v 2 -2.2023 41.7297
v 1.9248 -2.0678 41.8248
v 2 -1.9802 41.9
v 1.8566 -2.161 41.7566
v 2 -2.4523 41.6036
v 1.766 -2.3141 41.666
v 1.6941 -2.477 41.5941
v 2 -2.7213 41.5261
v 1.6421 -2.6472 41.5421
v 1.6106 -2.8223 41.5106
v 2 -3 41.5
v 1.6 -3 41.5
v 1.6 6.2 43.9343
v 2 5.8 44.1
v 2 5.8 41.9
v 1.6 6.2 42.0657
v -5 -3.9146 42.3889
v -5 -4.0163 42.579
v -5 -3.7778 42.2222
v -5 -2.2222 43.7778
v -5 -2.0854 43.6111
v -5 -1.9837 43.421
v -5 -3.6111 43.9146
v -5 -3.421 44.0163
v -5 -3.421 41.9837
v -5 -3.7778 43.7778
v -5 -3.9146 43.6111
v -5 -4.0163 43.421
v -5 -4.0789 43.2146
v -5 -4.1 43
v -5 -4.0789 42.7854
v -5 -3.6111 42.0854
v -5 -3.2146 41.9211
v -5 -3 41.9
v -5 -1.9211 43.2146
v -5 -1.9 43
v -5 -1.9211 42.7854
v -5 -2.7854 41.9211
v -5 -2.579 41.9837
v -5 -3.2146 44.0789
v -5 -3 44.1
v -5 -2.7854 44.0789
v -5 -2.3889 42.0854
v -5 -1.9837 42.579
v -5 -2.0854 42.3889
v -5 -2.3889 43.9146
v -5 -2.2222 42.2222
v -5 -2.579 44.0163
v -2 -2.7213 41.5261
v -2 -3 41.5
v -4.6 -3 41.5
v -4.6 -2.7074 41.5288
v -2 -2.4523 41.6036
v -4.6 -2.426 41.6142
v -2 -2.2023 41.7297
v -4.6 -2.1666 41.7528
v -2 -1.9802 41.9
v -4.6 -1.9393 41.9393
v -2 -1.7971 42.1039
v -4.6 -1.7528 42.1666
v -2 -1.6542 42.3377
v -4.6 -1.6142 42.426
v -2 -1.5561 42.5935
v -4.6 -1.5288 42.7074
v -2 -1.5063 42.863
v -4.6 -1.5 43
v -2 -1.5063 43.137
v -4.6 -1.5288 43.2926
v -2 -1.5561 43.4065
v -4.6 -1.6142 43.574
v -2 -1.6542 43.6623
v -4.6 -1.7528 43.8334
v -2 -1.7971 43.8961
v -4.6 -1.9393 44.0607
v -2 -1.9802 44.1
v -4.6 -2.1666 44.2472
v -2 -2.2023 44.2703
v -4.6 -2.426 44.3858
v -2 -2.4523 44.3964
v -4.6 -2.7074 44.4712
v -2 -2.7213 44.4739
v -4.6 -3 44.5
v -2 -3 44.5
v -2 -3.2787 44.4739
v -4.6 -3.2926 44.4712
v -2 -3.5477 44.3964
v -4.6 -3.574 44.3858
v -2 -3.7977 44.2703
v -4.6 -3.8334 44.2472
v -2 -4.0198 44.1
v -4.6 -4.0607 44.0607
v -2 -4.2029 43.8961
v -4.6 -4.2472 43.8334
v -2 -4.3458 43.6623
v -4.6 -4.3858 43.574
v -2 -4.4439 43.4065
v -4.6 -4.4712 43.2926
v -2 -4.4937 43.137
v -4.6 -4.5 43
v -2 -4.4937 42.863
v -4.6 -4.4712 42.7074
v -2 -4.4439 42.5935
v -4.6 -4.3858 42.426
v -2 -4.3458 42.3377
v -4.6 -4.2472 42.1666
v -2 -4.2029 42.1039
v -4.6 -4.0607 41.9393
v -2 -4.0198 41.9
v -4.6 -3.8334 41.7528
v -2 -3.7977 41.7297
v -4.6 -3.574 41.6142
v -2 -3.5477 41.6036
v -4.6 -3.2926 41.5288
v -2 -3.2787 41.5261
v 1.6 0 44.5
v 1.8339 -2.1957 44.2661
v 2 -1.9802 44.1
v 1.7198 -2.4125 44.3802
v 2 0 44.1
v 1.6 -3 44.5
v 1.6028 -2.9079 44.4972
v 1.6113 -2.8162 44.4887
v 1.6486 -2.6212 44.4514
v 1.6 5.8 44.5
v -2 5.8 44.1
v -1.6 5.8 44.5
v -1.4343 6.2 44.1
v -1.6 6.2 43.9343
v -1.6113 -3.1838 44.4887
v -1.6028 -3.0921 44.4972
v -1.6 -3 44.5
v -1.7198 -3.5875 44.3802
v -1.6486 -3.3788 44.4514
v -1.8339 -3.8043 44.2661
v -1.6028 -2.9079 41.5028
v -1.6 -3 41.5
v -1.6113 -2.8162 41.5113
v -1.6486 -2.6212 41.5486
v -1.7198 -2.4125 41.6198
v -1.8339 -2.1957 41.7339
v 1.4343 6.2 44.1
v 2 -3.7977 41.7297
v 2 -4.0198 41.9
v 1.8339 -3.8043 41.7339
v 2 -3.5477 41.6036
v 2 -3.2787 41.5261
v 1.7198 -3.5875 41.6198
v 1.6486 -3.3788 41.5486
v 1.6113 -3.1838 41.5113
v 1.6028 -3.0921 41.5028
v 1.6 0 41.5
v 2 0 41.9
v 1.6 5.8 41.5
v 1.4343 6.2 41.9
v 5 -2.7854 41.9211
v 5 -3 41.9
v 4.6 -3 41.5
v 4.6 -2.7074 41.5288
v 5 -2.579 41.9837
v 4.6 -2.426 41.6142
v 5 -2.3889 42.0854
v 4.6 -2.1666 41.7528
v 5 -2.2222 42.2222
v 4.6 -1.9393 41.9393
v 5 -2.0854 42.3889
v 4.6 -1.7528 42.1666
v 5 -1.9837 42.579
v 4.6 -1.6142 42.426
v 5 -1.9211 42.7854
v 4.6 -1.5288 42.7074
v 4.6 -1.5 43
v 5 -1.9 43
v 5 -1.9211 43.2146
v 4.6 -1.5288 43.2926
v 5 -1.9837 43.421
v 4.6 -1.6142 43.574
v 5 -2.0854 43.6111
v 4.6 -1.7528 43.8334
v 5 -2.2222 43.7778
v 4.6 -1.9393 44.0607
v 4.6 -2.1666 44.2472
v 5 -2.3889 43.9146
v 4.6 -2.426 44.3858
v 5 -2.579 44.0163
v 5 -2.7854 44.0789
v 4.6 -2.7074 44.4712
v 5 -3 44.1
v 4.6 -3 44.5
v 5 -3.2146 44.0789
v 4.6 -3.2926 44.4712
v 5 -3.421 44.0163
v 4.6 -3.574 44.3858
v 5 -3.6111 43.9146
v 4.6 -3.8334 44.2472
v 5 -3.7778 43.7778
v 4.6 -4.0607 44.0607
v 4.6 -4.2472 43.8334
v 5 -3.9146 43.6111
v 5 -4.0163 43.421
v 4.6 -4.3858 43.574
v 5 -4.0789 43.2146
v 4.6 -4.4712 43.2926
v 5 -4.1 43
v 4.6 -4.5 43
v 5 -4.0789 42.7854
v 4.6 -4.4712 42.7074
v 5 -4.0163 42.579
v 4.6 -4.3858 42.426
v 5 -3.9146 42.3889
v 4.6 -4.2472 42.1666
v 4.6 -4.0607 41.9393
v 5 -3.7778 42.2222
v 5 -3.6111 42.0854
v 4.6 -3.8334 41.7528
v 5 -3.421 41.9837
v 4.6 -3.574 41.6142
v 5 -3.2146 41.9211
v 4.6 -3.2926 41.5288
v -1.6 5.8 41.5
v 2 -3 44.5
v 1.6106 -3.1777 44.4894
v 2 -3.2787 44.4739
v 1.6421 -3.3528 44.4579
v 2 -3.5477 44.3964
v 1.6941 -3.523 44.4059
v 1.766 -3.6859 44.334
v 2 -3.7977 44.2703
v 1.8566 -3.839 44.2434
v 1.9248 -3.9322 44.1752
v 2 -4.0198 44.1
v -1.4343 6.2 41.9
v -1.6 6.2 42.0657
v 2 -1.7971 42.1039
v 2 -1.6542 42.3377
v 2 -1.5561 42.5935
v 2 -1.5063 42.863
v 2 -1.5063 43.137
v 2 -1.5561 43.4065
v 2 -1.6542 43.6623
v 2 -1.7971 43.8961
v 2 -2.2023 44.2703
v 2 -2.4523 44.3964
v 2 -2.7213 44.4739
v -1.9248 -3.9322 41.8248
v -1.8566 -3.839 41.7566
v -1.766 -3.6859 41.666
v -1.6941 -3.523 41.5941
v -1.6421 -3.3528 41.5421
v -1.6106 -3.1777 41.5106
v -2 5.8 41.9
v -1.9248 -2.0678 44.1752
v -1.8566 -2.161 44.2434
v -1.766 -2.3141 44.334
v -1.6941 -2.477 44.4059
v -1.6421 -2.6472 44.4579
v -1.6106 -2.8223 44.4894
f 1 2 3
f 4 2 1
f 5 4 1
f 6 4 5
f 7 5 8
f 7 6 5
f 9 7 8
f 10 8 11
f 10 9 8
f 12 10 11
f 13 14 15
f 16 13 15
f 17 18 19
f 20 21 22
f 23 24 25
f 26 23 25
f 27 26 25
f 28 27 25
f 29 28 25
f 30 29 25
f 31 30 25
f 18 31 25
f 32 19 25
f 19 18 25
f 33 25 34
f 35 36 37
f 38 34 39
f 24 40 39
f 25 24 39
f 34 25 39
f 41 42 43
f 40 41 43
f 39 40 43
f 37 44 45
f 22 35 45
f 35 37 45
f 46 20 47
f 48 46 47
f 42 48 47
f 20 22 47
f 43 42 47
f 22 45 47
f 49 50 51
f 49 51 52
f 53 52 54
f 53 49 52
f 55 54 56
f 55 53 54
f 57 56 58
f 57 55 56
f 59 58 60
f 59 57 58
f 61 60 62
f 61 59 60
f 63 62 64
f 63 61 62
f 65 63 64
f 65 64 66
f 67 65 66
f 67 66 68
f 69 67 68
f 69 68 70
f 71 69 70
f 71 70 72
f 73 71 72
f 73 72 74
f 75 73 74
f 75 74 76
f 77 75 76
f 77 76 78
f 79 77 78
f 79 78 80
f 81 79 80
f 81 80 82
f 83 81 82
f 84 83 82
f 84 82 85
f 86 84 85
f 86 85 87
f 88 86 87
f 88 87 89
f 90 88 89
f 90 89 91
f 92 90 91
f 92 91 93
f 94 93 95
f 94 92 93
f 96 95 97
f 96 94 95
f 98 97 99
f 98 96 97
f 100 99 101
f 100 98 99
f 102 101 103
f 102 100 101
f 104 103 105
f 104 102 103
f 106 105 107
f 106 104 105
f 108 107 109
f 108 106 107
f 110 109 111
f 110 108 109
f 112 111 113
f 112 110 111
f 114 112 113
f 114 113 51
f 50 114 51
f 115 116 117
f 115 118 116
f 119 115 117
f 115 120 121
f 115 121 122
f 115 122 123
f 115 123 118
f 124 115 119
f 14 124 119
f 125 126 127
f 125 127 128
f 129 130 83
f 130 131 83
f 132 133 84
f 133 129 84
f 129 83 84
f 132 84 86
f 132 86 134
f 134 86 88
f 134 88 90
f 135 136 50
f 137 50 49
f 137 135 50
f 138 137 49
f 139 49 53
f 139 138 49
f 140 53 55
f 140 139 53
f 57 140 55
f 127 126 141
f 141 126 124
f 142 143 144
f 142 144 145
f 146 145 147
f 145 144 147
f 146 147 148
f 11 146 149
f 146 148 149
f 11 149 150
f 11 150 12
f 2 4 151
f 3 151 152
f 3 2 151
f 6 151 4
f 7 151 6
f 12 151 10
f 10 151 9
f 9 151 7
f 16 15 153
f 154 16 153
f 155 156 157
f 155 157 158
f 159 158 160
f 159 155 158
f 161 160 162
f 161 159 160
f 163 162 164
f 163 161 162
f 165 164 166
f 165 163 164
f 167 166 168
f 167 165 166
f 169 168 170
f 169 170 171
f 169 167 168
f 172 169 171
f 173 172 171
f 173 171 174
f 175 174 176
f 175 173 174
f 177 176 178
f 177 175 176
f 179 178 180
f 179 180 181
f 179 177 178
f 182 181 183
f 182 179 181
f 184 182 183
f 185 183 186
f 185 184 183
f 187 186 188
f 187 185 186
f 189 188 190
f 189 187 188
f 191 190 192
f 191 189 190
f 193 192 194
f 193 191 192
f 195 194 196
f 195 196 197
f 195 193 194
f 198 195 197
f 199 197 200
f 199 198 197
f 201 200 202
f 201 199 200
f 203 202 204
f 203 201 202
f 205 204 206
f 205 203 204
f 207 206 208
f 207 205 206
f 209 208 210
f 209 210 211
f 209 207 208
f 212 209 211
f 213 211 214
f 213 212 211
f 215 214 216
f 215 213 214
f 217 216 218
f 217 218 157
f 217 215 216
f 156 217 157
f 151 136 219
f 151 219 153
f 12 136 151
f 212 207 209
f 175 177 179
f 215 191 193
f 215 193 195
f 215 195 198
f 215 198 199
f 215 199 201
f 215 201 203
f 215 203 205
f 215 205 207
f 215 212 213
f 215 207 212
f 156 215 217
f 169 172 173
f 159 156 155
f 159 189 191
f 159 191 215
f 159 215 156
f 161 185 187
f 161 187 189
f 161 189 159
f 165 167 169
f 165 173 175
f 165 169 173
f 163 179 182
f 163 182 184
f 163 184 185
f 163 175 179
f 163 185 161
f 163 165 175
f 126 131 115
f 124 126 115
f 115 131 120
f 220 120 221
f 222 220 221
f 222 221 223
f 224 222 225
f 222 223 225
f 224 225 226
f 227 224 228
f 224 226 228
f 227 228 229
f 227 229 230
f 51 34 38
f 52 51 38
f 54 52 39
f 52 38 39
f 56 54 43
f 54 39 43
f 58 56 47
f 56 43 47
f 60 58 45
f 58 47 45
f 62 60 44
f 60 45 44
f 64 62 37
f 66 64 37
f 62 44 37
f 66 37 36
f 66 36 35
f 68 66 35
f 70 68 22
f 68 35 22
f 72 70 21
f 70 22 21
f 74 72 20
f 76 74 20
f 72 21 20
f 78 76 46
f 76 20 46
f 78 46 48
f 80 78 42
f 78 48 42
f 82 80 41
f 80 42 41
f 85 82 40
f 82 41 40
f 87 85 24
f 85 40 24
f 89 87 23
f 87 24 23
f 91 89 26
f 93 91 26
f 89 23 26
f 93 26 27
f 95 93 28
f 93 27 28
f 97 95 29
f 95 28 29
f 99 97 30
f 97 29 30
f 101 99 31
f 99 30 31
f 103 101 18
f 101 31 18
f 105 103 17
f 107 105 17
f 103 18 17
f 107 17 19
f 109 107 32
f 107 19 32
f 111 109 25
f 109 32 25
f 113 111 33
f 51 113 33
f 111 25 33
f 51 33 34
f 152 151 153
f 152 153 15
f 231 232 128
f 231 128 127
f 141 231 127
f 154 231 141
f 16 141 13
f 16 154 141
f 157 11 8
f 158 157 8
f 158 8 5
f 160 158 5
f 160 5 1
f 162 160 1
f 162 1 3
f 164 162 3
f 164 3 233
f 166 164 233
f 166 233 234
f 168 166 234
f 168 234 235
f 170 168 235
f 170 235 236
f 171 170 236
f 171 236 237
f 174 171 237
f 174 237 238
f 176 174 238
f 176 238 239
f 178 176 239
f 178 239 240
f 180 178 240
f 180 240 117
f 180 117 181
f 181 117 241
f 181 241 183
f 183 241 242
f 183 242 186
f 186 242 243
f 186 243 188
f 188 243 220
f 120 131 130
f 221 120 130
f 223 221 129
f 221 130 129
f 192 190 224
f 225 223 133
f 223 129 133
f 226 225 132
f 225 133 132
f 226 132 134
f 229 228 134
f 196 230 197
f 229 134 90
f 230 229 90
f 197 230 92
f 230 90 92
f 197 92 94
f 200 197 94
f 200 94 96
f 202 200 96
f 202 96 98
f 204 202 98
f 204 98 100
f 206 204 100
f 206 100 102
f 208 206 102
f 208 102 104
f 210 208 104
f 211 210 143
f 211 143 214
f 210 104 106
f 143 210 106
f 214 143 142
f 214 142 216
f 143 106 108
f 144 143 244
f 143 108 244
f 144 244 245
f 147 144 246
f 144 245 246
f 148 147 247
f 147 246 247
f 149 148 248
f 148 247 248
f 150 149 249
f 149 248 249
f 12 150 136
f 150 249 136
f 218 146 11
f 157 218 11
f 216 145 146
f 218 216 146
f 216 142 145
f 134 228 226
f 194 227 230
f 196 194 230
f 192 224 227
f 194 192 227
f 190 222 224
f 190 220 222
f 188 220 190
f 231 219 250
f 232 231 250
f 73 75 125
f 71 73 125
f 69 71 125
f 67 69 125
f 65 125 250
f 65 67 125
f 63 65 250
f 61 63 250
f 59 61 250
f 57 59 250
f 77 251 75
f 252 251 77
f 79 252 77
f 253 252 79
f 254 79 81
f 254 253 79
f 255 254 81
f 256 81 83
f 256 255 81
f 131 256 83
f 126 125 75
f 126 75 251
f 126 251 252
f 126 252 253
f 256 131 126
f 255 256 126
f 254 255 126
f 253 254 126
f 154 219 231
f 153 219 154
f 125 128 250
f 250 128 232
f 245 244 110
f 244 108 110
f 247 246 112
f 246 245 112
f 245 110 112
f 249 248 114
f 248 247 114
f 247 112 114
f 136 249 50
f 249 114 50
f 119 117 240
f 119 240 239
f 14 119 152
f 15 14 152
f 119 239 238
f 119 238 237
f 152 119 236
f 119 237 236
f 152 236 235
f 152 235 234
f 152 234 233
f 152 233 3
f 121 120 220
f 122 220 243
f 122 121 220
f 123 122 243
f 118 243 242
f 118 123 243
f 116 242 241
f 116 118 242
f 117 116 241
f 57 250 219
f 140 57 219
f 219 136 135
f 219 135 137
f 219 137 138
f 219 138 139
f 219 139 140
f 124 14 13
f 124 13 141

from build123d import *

# Parameters (mm, degrees)
SKETCH_1_R               = 49.99999999999999
EXTRUDE_1_DEPTH          = 50
CUT_EXTRUDE_2_DEPTH      = 87.60254037844385
CUT_EXTRUDE_3_DEPTH      = 76.00000000000004
FILLET_1_R               = 2
CHAMFER_1_SIZE           = 0.6
SHELL_1_T                = -1.2
EXTRUDE_2_DEPTH          = 2
EXTRUDE_2_DEPTH_BACK     = 2
SKETCH_4_R               = 1.500000000000004
SKETCH_5_R               = 1.500000000000004
EXTRUDE_3_DEPTH          = 3
CUT_EXTRUDE_4_DEPTH      = 75.75240590513992
CUT_EXTRUDE_4_DEPTH_BACK = 75.75240590513992
SKETCH_7_W               = 4
SKETCH_7_H               = 3.000000000000007
EXTRUDE_4_DEPTH          = 3
SKETCH_8_W               = 61.68253403520822
SKETCH_8_H               = 49.35584928772633
CUT_EXTRUDE_5_DEPTH      = 75.75240590513992
SKETCH_9_W               = 4
SKETCH_9_H               = 3.000000000000007
EXTRUDE_5_DEPTH          = 6.2
CHAMFER_2_SIZE           = 0.4
CHAMFER_3_SIZE           = 0.4
CHAMFER_4_SIZE           = 0.4


with BuildPart() as part:
    # 草图1 → 凸台-拉伸1 (new body)
    with BuildSketch(Plane(origin=(0, 0, 0), x_dir=(1, 0, 0), z_dir=(0, 1, 0))):
        with Locations(Location((0, 0, 0), (0, 0, 270))):
            Circle(SKETCH_1_R)
    extrude(amount=EXTRUDE_1_DEPTH)

    # 草图2 → 切除-拉伸2 (cut, through all)
    with BuildSketch(Plane(origin=(0, 50, 0), x_dir=(1, 0, 0), z_dir=(0, 1, 0))):
        with BuildLine():
            Line((-24.999999999999993, -43.301270189221945), (-7.11e-15, -1.421e-14))
            Line((7.11e-15, -1.421e-14), (25.00000000000002, -43.301270189221924))
            ThreePointArc((25.00000000000002, -43.301270189221924), (2.487e-14, 50), (-25.000000000000053, -43.30127018922191))
        make_face()
    extrude(amount=-CUT_EXTRUDE_2_DEPTH, mode=Mode.SUBTRACT)

    # 草图3 → 切除-拉伸3 (cut, through all)
    with BuildSketch(Plane(origin=(0, 50, 0), x_dir=(1, 0, 0), z_dir=(0, 1, 0))):
        with BuildLine():
            ThreePointArc((-7.5000000000002185, -12.990381056766447), (-3.882285676537599, -14.488887394336077), (6.9403e-13, -14.999999999999996))
            ThreePointArc((6.9403e-13, -14.999999999999996), (3.8822856765382965, -14.488887394335892), (7.500000000000258, -12.990381056766429))
            Line((7.5, -12.990381056766573), (0, 0))
            Line((4.01e-15, 0), (-7.499999999999988, -12.990381056766578))
        make_face()
        with BuildLine():
            ThreePointArc((15, 0), (-7.499999999999881, 12.99038105676664), (-7.5000000000002185, -12.990381056766447))
            Line((-7.499999999999988, -12.990381056766578), (4.01e-15, 0))
            Line((0, 0), (7.5, -12.990381056766573))
            ThreePointArc((7.500000000000258, -12.990381056766429), (12.99038105676665, -7.499999999999878), (15, -3.67e-15))
        make_face()
        with BuildLine():
            ThreePointArc((7.500000000000258, -12.990381056766429), (3.8822856765382965, -14.488887394335892), (6.9403e-13, -14.999999999999996))
            Line((6.9456e-13, -15), (8.660254037844409, -15))
            Line((8.660254037844393, -15.000000000000004), (7.5, -12.990381056766573))
        make_face()
        with BuildLine():
            Line((-7.499999999999988, -12.990381056766578), (-8.660254037844377, -15.000000000000002))
            Line((-8.660254037844384, -15), (6.9456e-13, -15))
            ThreePointArc((6.9403e-13, -14.999999999999996), (-3.882285676537599, -14.488887394336077), (-7.5000000000002185, -12.990381056766447))
        make_face()
    extrude(amount=-CUT_EXTRUDE_3_DEPTH, mode=Mode.SUBTRACT)

    # 圆角1
    fillet_1_edges = [part.edges().sort_by_distance(p)[0] for p in [
        (25.00000000000002, 25, 43.301270189221924),
        (-25.00000000000002, 25, 43.301270189221924),
        (-8.66025403784438, 25, 15),
        (8.6602540378444, 25, 15.000000000000002),
    ]]
    fillet(fillet_1_edges, radius=FILLET_1_R)

    # 倒角1
    chamfer_1_edges = [part.edges().sort_by_distance(p)[0] for p in [
        (8.79e-15, 0, 15),
        (-16.608380961798794, -7.11e-15, 28.766559657295183),
        (16.60838096179882, 0, 28.766559657295183),
        (2.132e-14, 0, 50),
        (8.505553499465146, 0, 15.267949192431121),
        (24.16775252630995, 0, 43.09090065934718),
        (-24.16775252630992, 0, 43.09090065934719),
        (-8.505553499465128, 0, 15.267949192431121),
    ]]
    chamfer(chamfer_1_edges, length=CHAMFER_1_SIZE)

    # 抽壳1
    shell_1_openings = [part.faces().sort_by_distance(p)[0] for p in [
        (0, 50, 34.229276229),
    ]]
    offset(amount=SHELL_1_T, openings=shell_1_openings)

    # 草图4 → 凸台-拉伸2 (add, two sides: drawn at the far end of the back side and taken through both)
    with BuildSketch(Plane(origin=(0, 0, 0), x_dir=(0, 0, -1), z_dir=(1, 0, 0)).offset(-EXTRUDE_2_DEPTH_BACK)):
        with BuildLine():
            Line((-44.5, 0), (-44.5, -3))
            ThreePointArc((-44.50000000000001, -3), (-43, -1.499999999999996), (-41.49999999999999, -3))
            Line((-41.49999999999999, -3), (-41.49999999999999, 0))
            Line((-41.49999999999999, 0), (-44.5, 0))
        make_face()
        with Locations((-43, -3)):
            Circle(SKETCH_4_R)
    extrude(amount=EXTRUDE_2_DEPTH + EXTRUDE_2_DEPTH_BACK)

    # 草图5 → 凸台-拉伸3 (add)
    with BuildSketch(Plane(origin=(2, 0, 0), x_dir=(0, 0, -1), z_dir=(1, 0, 0))):
        with Locations((-43, -3)):
            Circle(SKETCH_5_R)
    extrude_3 = extrude(amount=EXTRUDE_3_DEPTH)

    # 镜向1: 凸台-拉伸3 across plane
    add(extrude_3.mirror(Plane(origin=(0, 0, 0), x_dir=(0, 0, 1), z_dir=(1, 0, 0))))

    # 草图6 → 切除-拉伸4 (cut, two sides: drawn at the far end of the back side and taken through both)
    with BuildSketch(Plane(origin=(0, 0, 0), x_dir=(0, 0, -1), z_dir=(1, 0, 0)).offset(-CUT_EXTRUDE_4_DEPTH_BACK)):
        with BuildLine():
            ThreePointArc((-41.533119314589705, 49.97969668707788), (-27.73588672288851, 47.754377602956666), (-15.000000000000043, 42.000000000000036))
            Line((-15, 42.00000000000006), (-15, 50))
            Line((-15, 50), (-16, 50))
            Line((-16, 50), (-41.53311931459036, 50))
            Line((-41.53311931459036, 50), (-41.53311931459036, 49.97969668707786))
        make_face()
    extrude(amount=CUT_EXTRUDE_4_DEPTH + CUT_EXTRUDE_4_DEPTH_BACK, mode=Mode.SUBTRACT)

    # 草图7 → 凸台-拉伸4 (add)
    with BuildSketch(Plane(origin=(0, 1.2, 0), x_dir=(1, 0, 0), z_dir=(0, 1, 0))):
        Polygon((-3.1999999999999997, -40.3), (3.1999999999999997, -40.3), (3.2000000000000006, -45.699999999999996), (-3.199999999999999, -45.699999999999996), align=None)
        with Locations((0, -43)):
            Rectangle(SKETCH_7_W, SKETCH_7_H, mode=Mode.SUBTRACT)
    extrude(amount=EXTRUDE_4_DEPTH)

    # 草图8 → 切除-拉伸5 (cut, through all)
    with BuildSketch(Plane.XZ):
        with Locations((0.9928928322647028, 29.450924327847446)):
            Rectangle(SKETCH_8_W, SKETCH_8_H)
    extrude(amount=-CUT_EXTRUDE_5_DEPTH, mode=Mode.SUBTRACT)

    # 草图9 → 凸台-拉伸5 (add)
    with BuildSketch(Plane(origin=(0, 0, 0), x_dir=(1, 0, 0), z_dir=(0, 1, 0))):
        with Locations((0, -43)):
            Rectangle(SKETCH_9_W, SKETCH_9_H)
    extrude(amount=EXTRUDE_5_DEPTH)

    # 倒角2
    # the kernel refuses this chamfer: 0.4 mm, written as the material it takes off along each edge
    with BuildSketch(Plane(origin=(2, 0, 44.5), x_dir=(-0.999621916911297, 0, 0.027495876610578732), z_dir=(0, 1, 0))) as chamfer_2_piece_1:
        Polygon((CHAMFER_2_SIZE * 0.999621916911, -CHAMFER_2_SIZE * 0.0274958766106), (-CHAMFER_2_SIZE * 0.0274958766106, -CHAMFER_2_SIZE * 0.999621916911), (0, 0), align=None)
    extrude(amount=7.228673195186364, mode=Mode.SUBTRACT)
    with BuildSketch(Plane(origin=(-2, 0, 41.49999999999999), x_dir=(-0.027495876610586577, 0, 0.9996219169112966), z_dir=(0, 1, 0))) as chamfer_2_piece_2:
        Polygon((CHAMFER_2_SIZE * 0.999621916911, CHAMFER_2_SIZE * 0.0274958766106), (-CHAMFER_2_SIZE * 0.0274958766106, CHAMFER_2_SIZE * 0.999621916911), (0, 0), align=None)
    extrude(amount=7.228673195186364, mode=Mode.SUBTRACT)
    with BuildSketch(Plane(origin=(-2, 0, 44.5), x_dir=(-0.027495876610586577, 0, -0.9996219169112966), z_dir=(0, 1, 0))) as chamfer_2_piece_3:
        Polygon((CHAMFER_2_SIZE * 0.999621916911, -CHAMFER_2_SIZE * 0.0274958766106), (-CHAMFER_2_SIZE * 0.0274958766106, -CHAMFER_2_SIZE * 0.999621916911), (0, 0), align=None)
    extrude(amount=7.228673195186364, mode=Mode.SUBTRACT)
    with BuildSketch(Plane(origin=(2, 0, 41.49999999999999), x_dir=(-0.999621916911297, 0, -0.027495876610578732), z_dir=(0, 1, 0))) as chamfer_2_piece_4:
        Polygon((CHAMFER_2_SIZE * 0.999621916911, CHAMFER_2_SIZE * 0.0274958766106), (-CHAMFER_2_SIZE * 0.0274958766106, CHAMFER_2_SIZE * 0.999621916911), (0, 0), align=None)
    extrude(amount=7.228673195186364, mode=Mode.SUBTRACT)
    with BuildSketch(Plane(origin=(2, -4.0286731951863635, 41.49999999999999), x_dir=(-0.999621916911297, 0, -0.027495876610578732), z_dir=(0, 1, 0))) as chamfer_2_piece_5_section:
        Polygon((CHAMFER_2_SIZE * 0.999621916911, CHAMFER_2_SIZE * 0.0274958766106), (-CHAMFER_2_SIZE * 0.0274958766106, CHAMFER_2_SIZE * 0.999621916911), (0, 0), align=None)
    chamfer_2_piece_5 = extrude(amount=4.0286731951863635, mode=Mode.PRIVATE)
    chamfer_2_piece_5 = chamfer_2_piece_5 - Plane(origin=(1.8624054064801094, -3, 43), x_dir=(0, 0, -1), z_dir=(-1, 0, 0)) * Cylinder(1.500000000000004, 10, mode=Mode.PRIVATE)
    add(chamfer_2_piece_5, mode=Mode.SUBTRACT)
    with BuildSketch(Plane(origin=(-2, 0, 44.5), x_dir=(-0.027495876610586577, 0, -0.9996219169112966), z_dir=(0, -1, 0))) as chamfer_2_piece_6_section:
        Polygon((CHAMFER_2_SIZE * 0.999621916911, CHAMFER_2_SIZE * 0.0274958766106), (-CHAMFER_2_SIZE * 0.0274958766106, CHAMFER_2_SIZE * 0.999621916911), (0, 0), align=None)
    chamfer_2_piece_6 = extrude(amount=4.028673195186364, mode=Mode.PRIVATE)
    chamfer_2_piece_6 = chamfer_2_piece_6 - Plane(origin=(-1.8624054062772368, -3, 43), x_dir=(0, 0, -1), z_dir=(1, 0, 0)) * Cylinder(1.500000000000004, 10, mode=Mode.PRIVATE)
    add(chamfer_2_piece_6, mode=Mode.SUBTRACT)
    with BuildSketch(Plane(origin=(-2, -4.0286731951863635, 41.49999999999999), x_dir=(-0.027495876610586577, 0, 0.9996219169112966), z_dir=(0, 1, 0))) as chamfer_2_piece_7_section:
        Polygon((CHAMFER_2_SIZE * 0.999621916911, CHAMFER_2_SIZE * 0.0274958766106), (-CHAMFER_2_SIZE * 0.0274958766106, CHAMFER_2_SIZE * 0.999621916911), (0, 0), align=None)
    chamfer_2_piece_7 = extrude(amount=4.0286731951863635, mode=Mode.PRIVATE)
    chamfer_2_piece_7 = chamfer_2_piece_7 - Plane(origin=(-1.8624054064801103, -3, 43), x_dir=(0, 0, -1), z_dir=(1, 0, 0)) * Cylinder(1.500000000000004, 10, mode=Mode.PRIVATE)
    add(chamfer_2_piece_7, mode=Mode.SUBTRACT)
    with BuildSketch(Plane(origin=(2, 0, 44.5), x_dir=(-0.999621916911297, 0, 0.027495876610578732), z_dir=(0, -1, 0))) as chamfer_2_piece_8_section:
        Polygon((CHAMFER_2_SIZE * 0.999621916911, CHAMFER_2_SIZE * 0.0274958766106), (-CHAMFER_2_SIZE * 0.0274958766106, CHAMFER_2_SIZE * 0.999621916911), (0, 0), align=None)
    chamfer_2_piece_8 = extrude(amount=4.028673195186364, mode=Mode.PRIVATE)
    chamfer_2_piece_8 = chamfer_2_piece_8 - Plane(origin=(1.8624054062774078, -3, 43), x_dir=(0, 0, -1), z_dir=(-1, 0, 0)) * Cylinder(1.500000000000004, 10, mode=Mode.PRIVATE)
    add(chamfer_2_piece_8, mode=Mode.SUBTRACT)

    # 倒角3
    chamfer_3_edges = [part.edges().sort_by_distance(p)[0] for p in [
        (0, 6.2, 44.5),
        (-2, 6.2, 43),
        (2, 6.2, 43),
        (0, 6.2, 41.49999999999999),
        (1.8000000000000584, 6.2, 41.69999999999994),
        (-1.8000000000000587, 6.2, 41.699999999999946),
        (-1.8000000000000587, 6.2, 44.300000000000054),
        (1.800000000000062, 6.2, 44.30000000000006),
    ]]
    chamfer(chamfer_3_edges, length=CHAMFER_3_SIZE)

    # 倒角4
    chamfer_4_edges = [part.edges().sort_by_distance(p)[0] for p in [
        (5, -3, 44.50000000000001),
        (-5, -3, 44.50000000000001),
    ]]
    chamfer(chamfer_4_edges, length=CHAMFER_4_SIZE)


solid = part.part
